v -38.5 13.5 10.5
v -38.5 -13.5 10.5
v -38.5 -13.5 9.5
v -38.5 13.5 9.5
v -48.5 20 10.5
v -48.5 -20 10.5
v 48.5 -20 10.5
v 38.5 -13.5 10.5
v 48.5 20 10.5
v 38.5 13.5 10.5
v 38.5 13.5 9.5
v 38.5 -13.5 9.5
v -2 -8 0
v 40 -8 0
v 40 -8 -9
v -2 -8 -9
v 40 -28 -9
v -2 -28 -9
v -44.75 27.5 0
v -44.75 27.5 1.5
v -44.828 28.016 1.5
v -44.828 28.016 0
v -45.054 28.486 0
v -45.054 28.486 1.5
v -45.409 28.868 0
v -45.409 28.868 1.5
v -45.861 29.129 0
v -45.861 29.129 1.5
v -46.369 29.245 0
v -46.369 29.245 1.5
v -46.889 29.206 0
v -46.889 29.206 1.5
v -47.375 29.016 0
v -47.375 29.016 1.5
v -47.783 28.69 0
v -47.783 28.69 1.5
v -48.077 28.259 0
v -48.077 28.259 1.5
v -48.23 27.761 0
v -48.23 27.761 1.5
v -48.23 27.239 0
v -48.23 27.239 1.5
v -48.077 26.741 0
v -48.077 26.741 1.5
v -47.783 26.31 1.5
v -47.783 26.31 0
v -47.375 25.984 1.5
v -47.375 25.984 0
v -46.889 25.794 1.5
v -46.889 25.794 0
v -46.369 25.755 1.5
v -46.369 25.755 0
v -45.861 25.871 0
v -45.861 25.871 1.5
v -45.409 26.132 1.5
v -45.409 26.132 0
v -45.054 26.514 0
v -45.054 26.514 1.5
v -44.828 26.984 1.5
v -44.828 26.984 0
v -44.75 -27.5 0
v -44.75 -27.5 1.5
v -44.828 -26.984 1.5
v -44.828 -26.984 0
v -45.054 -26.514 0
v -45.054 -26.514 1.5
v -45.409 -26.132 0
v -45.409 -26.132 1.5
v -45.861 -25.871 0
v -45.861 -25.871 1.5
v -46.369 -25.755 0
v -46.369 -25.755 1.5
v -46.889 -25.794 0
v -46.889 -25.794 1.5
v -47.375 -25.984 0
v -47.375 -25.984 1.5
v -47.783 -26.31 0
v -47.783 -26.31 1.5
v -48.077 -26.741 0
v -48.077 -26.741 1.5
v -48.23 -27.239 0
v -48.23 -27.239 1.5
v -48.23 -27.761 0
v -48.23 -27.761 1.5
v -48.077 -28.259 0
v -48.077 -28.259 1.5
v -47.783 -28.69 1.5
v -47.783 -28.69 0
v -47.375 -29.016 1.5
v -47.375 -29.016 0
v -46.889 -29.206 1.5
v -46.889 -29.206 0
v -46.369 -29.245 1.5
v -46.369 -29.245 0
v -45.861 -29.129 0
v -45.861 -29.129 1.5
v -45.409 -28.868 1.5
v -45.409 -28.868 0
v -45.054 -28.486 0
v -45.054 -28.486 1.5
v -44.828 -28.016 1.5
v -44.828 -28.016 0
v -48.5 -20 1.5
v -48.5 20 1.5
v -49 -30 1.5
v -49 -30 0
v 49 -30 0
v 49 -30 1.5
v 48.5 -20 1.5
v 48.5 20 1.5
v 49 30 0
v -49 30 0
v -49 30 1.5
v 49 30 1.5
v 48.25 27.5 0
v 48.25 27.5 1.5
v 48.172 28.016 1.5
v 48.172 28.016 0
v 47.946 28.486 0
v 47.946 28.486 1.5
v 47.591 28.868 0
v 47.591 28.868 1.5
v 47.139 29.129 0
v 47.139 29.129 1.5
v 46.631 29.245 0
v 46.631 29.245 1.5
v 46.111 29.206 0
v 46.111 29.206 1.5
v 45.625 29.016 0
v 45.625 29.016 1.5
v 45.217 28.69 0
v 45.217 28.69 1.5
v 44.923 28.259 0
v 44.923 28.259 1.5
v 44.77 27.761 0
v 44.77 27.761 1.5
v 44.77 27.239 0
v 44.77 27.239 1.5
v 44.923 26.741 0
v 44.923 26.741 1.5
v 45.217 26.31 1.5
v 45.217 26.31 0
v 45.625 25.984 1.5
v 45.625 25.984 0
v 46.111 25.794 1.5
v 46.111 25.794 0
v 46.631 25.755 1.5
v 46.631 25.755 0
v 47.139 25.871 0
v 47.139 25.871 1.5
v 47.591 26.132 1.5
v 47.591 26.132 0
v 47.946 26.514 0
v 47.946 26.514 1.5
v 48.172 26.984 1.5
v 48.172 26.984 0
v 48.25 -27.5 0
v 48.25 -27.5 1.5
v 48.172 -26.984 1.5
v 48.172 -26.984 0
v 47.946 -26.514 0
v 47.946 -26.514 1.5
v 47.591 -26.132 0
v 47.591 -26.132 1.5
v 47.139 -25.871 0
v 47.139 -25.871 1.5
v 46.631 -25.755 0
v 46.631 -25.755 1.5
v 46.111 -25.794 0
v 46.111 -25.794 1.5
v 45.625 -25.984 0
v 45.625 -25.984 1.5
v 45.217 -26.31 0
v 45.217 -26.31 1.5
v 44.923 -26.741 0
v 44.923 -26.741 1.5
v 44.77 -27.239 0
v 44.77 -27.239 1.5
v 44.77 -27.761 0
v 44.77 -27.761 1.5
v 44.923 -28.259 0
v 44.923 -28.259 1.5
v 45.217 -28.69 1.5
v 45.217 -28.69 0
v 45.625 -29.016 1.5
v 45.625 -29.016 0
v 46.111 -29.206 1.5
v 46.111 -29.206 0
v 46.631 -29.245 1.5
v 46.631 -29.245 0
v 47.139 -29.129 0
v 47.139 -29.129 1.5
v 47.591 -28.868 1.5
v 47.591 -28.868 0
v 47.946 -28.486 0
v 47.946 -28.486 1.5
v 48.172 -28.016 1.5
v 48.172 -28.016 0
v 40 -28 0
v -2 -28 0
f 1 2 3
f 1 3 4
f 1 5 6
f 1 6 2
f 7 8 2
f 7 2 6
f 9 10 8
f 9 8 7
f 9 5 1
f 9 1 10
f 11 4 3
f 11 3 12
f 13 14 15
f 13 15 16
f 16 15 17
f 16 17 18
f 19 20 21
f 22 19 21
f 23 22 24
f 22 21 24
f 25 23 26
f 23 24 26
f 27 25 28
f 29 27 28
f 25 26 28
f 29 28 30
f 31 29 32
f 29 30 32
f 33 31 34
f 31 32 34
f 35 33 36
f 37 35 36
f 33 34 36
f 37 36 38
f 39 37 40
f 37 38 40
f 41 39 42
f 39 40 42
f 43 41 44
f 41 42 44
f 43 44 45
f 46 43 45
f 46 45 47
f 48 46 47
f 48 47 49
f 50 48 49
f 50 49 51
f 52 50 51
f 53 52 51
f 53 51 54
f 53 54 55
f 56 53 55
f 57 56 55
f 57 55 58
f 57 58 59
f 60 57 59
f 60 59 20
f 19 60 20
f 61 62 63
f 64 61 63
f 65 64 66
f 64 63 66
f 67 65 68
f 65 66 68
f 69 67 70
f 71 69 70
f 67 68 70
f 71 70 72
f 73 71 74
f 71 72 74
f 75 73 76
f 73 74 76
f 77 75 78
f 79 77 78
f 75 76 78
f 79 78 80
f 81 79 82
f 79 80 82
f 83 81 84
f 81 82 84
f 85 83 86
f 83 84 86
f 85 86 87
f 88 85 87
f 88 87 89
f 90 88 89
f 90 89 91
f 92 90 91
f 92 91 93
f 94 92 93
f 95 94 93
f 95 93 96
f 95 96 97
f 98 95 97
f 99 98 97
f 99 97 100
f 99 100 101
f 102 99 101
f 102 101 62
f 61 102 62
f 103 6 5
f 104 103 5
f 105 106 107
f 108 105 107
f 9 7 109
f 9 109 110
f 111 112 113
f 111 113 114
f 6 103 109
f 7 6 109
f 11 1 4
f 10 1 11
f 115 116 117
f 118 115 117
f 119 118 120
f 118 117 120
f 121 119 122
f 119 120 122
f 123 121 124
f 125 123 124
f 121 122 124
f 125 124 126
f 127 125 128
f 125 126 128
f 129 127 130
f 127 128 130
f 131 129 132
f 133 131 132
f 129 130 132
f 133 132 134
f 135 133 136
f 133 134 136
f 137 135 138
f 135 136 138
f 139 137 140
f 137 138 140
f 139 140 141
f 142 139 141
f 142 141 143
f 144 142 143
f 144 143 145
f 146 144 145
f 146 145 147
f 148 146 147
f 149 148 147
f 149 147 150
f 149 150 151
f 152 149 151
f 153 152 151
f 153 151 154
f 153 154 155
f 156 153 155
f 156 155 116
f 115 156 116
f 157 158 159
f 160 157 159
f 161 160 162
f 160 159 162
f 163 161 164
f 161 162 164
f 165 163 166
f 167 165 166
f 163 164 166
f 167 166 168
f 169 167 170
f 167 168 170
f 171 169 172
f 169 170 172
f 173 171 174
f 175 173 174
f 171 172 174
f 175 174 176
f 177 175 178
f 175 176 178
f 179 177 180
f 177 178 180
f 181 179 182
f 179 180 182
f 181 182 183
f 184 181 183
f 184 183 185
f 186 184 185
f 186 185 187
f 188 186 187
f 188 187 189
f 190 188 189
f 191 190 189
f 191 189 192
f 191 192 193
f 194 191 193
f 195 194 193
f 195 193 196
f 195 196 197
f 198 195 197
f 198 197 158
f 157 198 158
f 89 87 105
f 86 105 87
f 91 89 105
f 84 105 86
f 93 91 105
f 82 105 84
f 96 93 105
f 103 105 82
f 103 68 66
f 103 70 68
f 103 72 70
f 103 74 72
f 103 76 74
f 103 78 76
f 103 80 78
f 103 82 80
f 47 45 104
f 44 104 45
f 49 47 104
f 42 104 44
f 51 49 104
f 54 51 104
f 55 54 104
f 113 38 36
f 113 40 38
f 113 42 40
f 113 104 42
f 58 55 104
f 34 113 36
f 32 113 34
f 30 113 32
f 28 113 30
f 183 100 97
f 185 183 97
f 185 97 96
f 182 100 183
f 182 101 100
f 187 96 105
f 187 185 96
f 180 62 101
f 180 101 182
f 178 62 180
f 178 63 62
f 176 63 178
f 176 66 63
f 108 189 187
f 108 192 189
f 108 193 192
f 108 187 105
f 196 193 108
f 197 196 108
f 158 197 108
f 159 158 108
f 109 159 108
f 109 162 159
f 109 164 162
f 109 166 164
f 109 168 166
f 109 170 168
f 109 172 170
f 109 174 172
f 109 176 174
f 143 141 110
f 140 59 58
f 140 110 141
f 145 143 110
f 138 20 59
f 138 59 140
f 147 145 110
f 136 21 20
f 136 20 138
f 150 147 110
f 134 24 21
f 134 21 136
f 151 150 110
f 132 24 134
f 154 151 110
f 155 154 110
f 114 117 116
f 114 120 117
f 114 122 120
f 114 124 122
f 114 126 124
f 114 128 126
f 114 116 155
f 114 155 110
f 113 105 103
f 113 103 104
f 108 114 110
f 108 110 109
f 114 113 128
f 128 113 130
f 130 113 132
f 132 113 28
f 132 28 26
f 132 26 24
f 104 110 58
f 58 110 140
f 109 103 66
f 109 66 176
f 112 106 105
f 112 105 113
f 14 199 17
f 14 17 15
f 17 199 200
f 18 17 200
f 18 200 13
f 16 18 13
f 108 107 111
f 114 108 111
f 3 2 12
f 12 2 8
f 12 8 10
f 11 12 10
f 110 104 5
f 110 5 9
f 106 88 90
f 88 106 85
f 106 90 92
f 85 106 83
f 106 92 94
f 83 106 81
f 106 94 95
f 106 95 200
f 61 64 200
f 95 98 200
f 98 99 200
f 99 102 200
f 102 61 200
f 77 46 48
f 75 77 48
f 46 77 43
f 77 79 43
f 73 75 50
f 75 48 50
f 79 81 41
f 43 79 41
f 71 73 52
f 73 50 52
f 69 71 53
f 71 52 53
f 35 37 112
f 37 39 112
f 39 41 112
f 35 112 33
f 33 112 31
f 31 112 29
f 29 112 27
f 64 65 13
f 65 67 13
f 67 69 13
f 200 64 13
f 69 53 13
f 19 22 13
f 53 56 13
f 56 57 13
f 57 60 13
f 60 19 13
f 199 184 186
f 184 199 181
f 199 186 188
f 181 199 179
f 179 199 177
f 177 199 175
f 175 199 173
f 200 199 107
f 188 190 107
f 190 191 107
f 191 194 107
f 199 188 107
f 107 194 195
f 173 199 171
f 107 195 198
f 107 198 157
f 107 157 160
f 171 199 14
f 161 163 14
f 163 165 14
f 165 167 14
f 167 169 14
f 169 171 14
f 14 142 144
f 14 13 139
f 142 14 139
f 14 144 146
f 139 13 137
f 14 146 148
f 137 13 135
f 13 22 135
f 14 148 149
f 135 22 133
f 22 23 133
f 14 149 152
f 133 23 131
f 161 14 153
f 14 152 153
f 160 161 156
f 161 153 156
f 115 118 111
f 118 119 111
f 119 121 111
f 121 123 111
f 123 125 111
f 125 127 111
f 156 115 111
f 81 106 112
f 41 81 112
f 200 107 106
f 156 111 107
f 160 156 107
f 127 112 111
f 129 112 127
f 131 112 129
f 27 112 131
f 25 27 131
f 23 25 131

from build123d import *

# Parameters (mm, degrees)
SKETCH1_W           = 98
SKETCH1_H           = 60
BOSS_EXTRUDE1_DEPTH = 1.5
SKETCH2_W           = 98
SKETCH2_H           = 40
BOSS_EXTRUDE2_DEPTH = 9
SKETCH3_W           = 77
SKETCH3_H           = 27
CUT_EXTRUDE1_DEPTH  = 1
SKETCH4_R           = 1.75
CUT_EXTRUDE2_DEPTH  = 2.5
SKETCH5_W           = 42
SKETCH5_H           = 20
BOSS_EXTRUDE3_DEPTH = 9
SKETCH6_W           = 18.449888981
SKETCH6_H           = 44.735350261
SKETCH6_W_2         = 5.736894001
SKETCH6_H_2         = 46.054623325
CUT_EXTRUDE3_DEPTH  = 9


with BuildPart() as part:
    # Sketch1 → Boss-Extrude1 (new body)
    with BuildSketch(Plane.XY):
        Rectangle(SKETCH1_W, SKETCH1_H)
    extrude(amount=BOSS_EXTRUDE1_DEPTH)

    # Sketch2 → Boss-Extrude2 (add)
    with BuildSketch(Plane.XY.offset(1.5)):
        Rectangle(SKETCH2_W, SKETCH2_H)
    extrude(amount=BOSS_EXTRUDE2_DEPTH)

    # Sketch3 → Cut-Extrude1 (cut)
    with BuildSketch(Plane.XY.offset(10.5)):
        Rectangle(SKETCH3_W, SKETCH3_H)
    extrude(amount=-CUT_EXTRUDE1_DEPTH, mode=Mode.SUBTRACT)

    # Sketch4 → Cut-Extrude2 (cut, through all)
    with BuildSketch(Plane.XY.offset(1.5)):
        with Locations((-46.5, 27.5)):
            Circle(SKETCH4_R)
        with Locations((46.5, 27.5)):
            Circle(SKETCH4_R)
        with Locations((46.5, -27.5)):
            Circle(SKETCH4_R)
        with Locations((-46.5, -27.5)):
            Circle(SKETCH4_R)
    extrude(amount=-CUT_EXTRUDE2_DEPTH, mode=Mode.SUBTRACT)

    # Sketch5 → Boss-Extrude3 (add)
    with BuildSketch(Plane(origin=(0, 0, 0), x_dir=(-1, 0, 0), z_dir=(0, 0, -1))):
        with Locations((-19, -18)):
            Rectangle(SKETCH5_W, SKETCH5_H)
    extrude(amount=BOSS_EXTRUDE3_DEPTH)

    # Sketch6 → Cut-Extrude3 (cut)
    with BuildSketch(Plane.XY.offset(10.5)):
        with Locations((-57.724944491, 0.8097006)):
            Rectangle(SKETCH6_W, SKETCH6_H)
        with Locations((51.368447, 0.150064069)):
            Rectangle(SKETCH6_W_2, SKETCH6_H_2)
    extrude(amount=-CUT_EXTRUDE3_DEPTH, mode=Mode.SUBTRACT)


solid = part.part
